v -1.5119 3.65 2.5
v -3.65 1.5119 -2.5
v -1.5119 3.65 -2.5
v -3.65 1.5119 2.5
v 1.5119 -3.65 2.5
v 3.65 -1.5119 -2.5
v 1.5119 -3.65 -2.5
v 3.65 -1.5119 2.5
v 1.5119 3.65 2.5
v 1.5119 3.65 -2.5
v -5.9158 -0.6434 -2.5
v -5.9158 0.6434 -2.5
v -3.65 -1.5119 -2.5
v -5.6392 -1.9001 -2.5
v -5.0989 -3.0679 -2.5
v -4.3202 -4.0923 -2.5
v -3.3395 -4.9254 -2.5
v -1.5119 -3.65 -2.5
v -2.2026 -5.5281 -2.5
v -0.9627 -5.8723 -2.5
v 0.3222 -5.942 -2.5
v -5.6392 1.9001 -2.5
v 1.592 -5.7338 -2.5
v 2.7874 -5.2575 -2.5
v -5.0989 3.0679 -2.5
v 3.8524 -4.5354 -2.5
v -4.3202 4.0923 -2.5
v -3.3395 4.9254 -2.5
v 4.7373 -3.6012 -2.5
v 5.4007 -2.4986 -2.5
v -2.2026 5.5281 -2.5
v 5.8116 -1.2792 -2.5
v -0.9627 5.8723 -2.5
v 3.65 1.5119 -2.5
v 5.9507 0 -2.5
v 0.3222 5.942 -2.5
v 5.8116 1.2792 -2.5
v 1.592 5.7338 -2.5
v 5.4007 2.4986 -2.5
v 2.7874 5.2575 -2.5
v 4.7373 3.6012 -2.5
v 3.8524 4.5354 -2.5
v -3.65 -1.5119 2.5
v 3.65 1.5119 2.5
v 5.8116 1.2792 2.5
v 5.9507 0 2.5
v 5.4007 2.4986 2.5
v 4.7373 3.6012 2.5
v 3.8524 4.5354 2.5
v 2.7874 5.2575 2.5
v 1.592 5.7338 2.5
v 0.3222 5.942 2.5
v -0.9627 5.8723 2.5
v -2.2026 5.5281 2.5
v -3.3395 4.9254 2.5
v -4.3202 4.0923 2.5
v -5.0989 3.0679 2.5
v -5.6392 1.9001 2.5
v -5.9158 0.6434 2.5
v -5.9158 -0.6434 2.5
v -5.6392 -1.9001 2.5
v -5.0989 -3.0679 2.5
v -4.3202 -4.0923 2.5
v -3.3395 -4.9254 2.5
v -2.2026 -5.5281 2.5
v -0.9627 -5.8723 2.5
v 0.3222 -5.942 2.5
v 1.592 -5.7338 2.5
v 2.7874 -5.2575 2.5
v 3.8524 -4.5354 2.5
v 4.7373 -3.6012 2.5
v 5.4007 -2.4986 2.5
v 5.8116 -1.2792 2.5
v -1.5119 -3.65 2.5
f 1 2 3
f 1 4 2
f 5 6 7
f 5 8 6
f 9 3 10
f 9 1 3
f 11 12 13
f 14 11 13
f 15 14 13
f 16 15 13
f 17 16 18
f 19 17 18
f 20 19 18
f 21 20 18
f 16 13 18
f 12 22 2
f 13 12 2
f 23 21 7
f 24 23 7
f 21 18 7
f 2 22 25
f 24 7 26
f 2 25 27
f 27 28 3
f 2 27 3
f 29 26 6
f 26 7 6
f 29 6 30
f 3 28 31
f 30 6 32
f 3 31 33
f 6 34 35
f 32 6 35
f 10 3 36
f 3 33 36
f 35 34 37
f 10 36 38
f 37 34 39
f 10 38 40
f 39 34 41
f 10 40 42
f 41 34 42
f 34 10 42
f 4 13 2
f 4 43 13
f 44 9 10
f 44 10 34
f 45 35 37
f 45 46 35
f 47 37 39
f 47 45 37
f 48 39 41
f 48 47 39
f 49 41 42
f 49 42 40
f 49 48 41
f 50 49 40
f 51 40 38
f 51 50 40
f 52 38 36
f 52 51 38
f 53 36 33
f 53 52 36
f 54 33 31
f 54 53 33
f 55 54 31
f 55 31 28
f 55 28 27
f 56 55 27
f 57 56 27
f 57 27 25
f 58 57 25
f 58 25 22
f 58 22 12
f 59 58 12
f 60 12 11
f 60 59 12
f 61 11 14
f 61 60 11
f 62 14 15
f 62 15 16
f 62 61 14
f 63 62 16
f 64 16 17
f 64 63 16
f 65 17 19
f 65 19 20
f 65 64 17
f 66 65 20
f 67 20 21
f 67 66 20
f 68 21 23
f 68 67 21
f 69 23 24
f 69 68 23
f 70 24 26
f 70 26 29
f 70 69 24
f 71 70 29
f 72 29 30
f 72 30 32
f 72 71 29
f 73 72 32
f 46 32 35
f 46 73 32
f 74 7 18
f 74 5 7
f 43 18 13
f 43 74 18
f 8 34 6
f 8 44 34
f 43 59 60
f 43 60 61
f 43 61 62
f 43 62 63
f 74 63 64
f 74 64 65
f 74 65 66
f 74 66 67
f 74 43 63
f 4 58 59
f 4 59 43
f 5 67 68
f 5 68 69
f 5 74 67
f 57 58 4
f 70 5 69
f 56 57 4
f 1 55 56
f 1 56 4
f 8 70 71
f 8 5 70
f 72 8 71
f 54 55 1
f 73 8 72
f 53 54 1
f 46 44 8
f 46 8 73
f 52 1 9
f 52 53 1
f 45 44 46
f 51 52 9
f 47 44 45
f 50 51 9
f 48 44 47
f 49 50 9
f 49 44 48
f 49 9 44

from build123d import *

# Parameters (mm, degrees)
F0_R     = 5.9507315311
F1_DEPTH = 2.5


with BuildPart() as f1:
    # F0 (on Top) → F1 (new body, symmetric)
    with BuildSketch(Plane.XY):
        Circle(F0_R)
        Polygon((1.5118795027, 3.65), (3.65, 1.5118795027), (3.65, -1.5118795027), (1.5118795027, -3.65), (-1.5118795027, -3.65), (-3.65, -1.5118795027), (-3.65, 1.5118795027), (-1.5118795027, 3.65), align=None, mode=Mode.SUBTRACT)
    extrude(amount=F1_DEPTH, both=True)


solid = f1.part
